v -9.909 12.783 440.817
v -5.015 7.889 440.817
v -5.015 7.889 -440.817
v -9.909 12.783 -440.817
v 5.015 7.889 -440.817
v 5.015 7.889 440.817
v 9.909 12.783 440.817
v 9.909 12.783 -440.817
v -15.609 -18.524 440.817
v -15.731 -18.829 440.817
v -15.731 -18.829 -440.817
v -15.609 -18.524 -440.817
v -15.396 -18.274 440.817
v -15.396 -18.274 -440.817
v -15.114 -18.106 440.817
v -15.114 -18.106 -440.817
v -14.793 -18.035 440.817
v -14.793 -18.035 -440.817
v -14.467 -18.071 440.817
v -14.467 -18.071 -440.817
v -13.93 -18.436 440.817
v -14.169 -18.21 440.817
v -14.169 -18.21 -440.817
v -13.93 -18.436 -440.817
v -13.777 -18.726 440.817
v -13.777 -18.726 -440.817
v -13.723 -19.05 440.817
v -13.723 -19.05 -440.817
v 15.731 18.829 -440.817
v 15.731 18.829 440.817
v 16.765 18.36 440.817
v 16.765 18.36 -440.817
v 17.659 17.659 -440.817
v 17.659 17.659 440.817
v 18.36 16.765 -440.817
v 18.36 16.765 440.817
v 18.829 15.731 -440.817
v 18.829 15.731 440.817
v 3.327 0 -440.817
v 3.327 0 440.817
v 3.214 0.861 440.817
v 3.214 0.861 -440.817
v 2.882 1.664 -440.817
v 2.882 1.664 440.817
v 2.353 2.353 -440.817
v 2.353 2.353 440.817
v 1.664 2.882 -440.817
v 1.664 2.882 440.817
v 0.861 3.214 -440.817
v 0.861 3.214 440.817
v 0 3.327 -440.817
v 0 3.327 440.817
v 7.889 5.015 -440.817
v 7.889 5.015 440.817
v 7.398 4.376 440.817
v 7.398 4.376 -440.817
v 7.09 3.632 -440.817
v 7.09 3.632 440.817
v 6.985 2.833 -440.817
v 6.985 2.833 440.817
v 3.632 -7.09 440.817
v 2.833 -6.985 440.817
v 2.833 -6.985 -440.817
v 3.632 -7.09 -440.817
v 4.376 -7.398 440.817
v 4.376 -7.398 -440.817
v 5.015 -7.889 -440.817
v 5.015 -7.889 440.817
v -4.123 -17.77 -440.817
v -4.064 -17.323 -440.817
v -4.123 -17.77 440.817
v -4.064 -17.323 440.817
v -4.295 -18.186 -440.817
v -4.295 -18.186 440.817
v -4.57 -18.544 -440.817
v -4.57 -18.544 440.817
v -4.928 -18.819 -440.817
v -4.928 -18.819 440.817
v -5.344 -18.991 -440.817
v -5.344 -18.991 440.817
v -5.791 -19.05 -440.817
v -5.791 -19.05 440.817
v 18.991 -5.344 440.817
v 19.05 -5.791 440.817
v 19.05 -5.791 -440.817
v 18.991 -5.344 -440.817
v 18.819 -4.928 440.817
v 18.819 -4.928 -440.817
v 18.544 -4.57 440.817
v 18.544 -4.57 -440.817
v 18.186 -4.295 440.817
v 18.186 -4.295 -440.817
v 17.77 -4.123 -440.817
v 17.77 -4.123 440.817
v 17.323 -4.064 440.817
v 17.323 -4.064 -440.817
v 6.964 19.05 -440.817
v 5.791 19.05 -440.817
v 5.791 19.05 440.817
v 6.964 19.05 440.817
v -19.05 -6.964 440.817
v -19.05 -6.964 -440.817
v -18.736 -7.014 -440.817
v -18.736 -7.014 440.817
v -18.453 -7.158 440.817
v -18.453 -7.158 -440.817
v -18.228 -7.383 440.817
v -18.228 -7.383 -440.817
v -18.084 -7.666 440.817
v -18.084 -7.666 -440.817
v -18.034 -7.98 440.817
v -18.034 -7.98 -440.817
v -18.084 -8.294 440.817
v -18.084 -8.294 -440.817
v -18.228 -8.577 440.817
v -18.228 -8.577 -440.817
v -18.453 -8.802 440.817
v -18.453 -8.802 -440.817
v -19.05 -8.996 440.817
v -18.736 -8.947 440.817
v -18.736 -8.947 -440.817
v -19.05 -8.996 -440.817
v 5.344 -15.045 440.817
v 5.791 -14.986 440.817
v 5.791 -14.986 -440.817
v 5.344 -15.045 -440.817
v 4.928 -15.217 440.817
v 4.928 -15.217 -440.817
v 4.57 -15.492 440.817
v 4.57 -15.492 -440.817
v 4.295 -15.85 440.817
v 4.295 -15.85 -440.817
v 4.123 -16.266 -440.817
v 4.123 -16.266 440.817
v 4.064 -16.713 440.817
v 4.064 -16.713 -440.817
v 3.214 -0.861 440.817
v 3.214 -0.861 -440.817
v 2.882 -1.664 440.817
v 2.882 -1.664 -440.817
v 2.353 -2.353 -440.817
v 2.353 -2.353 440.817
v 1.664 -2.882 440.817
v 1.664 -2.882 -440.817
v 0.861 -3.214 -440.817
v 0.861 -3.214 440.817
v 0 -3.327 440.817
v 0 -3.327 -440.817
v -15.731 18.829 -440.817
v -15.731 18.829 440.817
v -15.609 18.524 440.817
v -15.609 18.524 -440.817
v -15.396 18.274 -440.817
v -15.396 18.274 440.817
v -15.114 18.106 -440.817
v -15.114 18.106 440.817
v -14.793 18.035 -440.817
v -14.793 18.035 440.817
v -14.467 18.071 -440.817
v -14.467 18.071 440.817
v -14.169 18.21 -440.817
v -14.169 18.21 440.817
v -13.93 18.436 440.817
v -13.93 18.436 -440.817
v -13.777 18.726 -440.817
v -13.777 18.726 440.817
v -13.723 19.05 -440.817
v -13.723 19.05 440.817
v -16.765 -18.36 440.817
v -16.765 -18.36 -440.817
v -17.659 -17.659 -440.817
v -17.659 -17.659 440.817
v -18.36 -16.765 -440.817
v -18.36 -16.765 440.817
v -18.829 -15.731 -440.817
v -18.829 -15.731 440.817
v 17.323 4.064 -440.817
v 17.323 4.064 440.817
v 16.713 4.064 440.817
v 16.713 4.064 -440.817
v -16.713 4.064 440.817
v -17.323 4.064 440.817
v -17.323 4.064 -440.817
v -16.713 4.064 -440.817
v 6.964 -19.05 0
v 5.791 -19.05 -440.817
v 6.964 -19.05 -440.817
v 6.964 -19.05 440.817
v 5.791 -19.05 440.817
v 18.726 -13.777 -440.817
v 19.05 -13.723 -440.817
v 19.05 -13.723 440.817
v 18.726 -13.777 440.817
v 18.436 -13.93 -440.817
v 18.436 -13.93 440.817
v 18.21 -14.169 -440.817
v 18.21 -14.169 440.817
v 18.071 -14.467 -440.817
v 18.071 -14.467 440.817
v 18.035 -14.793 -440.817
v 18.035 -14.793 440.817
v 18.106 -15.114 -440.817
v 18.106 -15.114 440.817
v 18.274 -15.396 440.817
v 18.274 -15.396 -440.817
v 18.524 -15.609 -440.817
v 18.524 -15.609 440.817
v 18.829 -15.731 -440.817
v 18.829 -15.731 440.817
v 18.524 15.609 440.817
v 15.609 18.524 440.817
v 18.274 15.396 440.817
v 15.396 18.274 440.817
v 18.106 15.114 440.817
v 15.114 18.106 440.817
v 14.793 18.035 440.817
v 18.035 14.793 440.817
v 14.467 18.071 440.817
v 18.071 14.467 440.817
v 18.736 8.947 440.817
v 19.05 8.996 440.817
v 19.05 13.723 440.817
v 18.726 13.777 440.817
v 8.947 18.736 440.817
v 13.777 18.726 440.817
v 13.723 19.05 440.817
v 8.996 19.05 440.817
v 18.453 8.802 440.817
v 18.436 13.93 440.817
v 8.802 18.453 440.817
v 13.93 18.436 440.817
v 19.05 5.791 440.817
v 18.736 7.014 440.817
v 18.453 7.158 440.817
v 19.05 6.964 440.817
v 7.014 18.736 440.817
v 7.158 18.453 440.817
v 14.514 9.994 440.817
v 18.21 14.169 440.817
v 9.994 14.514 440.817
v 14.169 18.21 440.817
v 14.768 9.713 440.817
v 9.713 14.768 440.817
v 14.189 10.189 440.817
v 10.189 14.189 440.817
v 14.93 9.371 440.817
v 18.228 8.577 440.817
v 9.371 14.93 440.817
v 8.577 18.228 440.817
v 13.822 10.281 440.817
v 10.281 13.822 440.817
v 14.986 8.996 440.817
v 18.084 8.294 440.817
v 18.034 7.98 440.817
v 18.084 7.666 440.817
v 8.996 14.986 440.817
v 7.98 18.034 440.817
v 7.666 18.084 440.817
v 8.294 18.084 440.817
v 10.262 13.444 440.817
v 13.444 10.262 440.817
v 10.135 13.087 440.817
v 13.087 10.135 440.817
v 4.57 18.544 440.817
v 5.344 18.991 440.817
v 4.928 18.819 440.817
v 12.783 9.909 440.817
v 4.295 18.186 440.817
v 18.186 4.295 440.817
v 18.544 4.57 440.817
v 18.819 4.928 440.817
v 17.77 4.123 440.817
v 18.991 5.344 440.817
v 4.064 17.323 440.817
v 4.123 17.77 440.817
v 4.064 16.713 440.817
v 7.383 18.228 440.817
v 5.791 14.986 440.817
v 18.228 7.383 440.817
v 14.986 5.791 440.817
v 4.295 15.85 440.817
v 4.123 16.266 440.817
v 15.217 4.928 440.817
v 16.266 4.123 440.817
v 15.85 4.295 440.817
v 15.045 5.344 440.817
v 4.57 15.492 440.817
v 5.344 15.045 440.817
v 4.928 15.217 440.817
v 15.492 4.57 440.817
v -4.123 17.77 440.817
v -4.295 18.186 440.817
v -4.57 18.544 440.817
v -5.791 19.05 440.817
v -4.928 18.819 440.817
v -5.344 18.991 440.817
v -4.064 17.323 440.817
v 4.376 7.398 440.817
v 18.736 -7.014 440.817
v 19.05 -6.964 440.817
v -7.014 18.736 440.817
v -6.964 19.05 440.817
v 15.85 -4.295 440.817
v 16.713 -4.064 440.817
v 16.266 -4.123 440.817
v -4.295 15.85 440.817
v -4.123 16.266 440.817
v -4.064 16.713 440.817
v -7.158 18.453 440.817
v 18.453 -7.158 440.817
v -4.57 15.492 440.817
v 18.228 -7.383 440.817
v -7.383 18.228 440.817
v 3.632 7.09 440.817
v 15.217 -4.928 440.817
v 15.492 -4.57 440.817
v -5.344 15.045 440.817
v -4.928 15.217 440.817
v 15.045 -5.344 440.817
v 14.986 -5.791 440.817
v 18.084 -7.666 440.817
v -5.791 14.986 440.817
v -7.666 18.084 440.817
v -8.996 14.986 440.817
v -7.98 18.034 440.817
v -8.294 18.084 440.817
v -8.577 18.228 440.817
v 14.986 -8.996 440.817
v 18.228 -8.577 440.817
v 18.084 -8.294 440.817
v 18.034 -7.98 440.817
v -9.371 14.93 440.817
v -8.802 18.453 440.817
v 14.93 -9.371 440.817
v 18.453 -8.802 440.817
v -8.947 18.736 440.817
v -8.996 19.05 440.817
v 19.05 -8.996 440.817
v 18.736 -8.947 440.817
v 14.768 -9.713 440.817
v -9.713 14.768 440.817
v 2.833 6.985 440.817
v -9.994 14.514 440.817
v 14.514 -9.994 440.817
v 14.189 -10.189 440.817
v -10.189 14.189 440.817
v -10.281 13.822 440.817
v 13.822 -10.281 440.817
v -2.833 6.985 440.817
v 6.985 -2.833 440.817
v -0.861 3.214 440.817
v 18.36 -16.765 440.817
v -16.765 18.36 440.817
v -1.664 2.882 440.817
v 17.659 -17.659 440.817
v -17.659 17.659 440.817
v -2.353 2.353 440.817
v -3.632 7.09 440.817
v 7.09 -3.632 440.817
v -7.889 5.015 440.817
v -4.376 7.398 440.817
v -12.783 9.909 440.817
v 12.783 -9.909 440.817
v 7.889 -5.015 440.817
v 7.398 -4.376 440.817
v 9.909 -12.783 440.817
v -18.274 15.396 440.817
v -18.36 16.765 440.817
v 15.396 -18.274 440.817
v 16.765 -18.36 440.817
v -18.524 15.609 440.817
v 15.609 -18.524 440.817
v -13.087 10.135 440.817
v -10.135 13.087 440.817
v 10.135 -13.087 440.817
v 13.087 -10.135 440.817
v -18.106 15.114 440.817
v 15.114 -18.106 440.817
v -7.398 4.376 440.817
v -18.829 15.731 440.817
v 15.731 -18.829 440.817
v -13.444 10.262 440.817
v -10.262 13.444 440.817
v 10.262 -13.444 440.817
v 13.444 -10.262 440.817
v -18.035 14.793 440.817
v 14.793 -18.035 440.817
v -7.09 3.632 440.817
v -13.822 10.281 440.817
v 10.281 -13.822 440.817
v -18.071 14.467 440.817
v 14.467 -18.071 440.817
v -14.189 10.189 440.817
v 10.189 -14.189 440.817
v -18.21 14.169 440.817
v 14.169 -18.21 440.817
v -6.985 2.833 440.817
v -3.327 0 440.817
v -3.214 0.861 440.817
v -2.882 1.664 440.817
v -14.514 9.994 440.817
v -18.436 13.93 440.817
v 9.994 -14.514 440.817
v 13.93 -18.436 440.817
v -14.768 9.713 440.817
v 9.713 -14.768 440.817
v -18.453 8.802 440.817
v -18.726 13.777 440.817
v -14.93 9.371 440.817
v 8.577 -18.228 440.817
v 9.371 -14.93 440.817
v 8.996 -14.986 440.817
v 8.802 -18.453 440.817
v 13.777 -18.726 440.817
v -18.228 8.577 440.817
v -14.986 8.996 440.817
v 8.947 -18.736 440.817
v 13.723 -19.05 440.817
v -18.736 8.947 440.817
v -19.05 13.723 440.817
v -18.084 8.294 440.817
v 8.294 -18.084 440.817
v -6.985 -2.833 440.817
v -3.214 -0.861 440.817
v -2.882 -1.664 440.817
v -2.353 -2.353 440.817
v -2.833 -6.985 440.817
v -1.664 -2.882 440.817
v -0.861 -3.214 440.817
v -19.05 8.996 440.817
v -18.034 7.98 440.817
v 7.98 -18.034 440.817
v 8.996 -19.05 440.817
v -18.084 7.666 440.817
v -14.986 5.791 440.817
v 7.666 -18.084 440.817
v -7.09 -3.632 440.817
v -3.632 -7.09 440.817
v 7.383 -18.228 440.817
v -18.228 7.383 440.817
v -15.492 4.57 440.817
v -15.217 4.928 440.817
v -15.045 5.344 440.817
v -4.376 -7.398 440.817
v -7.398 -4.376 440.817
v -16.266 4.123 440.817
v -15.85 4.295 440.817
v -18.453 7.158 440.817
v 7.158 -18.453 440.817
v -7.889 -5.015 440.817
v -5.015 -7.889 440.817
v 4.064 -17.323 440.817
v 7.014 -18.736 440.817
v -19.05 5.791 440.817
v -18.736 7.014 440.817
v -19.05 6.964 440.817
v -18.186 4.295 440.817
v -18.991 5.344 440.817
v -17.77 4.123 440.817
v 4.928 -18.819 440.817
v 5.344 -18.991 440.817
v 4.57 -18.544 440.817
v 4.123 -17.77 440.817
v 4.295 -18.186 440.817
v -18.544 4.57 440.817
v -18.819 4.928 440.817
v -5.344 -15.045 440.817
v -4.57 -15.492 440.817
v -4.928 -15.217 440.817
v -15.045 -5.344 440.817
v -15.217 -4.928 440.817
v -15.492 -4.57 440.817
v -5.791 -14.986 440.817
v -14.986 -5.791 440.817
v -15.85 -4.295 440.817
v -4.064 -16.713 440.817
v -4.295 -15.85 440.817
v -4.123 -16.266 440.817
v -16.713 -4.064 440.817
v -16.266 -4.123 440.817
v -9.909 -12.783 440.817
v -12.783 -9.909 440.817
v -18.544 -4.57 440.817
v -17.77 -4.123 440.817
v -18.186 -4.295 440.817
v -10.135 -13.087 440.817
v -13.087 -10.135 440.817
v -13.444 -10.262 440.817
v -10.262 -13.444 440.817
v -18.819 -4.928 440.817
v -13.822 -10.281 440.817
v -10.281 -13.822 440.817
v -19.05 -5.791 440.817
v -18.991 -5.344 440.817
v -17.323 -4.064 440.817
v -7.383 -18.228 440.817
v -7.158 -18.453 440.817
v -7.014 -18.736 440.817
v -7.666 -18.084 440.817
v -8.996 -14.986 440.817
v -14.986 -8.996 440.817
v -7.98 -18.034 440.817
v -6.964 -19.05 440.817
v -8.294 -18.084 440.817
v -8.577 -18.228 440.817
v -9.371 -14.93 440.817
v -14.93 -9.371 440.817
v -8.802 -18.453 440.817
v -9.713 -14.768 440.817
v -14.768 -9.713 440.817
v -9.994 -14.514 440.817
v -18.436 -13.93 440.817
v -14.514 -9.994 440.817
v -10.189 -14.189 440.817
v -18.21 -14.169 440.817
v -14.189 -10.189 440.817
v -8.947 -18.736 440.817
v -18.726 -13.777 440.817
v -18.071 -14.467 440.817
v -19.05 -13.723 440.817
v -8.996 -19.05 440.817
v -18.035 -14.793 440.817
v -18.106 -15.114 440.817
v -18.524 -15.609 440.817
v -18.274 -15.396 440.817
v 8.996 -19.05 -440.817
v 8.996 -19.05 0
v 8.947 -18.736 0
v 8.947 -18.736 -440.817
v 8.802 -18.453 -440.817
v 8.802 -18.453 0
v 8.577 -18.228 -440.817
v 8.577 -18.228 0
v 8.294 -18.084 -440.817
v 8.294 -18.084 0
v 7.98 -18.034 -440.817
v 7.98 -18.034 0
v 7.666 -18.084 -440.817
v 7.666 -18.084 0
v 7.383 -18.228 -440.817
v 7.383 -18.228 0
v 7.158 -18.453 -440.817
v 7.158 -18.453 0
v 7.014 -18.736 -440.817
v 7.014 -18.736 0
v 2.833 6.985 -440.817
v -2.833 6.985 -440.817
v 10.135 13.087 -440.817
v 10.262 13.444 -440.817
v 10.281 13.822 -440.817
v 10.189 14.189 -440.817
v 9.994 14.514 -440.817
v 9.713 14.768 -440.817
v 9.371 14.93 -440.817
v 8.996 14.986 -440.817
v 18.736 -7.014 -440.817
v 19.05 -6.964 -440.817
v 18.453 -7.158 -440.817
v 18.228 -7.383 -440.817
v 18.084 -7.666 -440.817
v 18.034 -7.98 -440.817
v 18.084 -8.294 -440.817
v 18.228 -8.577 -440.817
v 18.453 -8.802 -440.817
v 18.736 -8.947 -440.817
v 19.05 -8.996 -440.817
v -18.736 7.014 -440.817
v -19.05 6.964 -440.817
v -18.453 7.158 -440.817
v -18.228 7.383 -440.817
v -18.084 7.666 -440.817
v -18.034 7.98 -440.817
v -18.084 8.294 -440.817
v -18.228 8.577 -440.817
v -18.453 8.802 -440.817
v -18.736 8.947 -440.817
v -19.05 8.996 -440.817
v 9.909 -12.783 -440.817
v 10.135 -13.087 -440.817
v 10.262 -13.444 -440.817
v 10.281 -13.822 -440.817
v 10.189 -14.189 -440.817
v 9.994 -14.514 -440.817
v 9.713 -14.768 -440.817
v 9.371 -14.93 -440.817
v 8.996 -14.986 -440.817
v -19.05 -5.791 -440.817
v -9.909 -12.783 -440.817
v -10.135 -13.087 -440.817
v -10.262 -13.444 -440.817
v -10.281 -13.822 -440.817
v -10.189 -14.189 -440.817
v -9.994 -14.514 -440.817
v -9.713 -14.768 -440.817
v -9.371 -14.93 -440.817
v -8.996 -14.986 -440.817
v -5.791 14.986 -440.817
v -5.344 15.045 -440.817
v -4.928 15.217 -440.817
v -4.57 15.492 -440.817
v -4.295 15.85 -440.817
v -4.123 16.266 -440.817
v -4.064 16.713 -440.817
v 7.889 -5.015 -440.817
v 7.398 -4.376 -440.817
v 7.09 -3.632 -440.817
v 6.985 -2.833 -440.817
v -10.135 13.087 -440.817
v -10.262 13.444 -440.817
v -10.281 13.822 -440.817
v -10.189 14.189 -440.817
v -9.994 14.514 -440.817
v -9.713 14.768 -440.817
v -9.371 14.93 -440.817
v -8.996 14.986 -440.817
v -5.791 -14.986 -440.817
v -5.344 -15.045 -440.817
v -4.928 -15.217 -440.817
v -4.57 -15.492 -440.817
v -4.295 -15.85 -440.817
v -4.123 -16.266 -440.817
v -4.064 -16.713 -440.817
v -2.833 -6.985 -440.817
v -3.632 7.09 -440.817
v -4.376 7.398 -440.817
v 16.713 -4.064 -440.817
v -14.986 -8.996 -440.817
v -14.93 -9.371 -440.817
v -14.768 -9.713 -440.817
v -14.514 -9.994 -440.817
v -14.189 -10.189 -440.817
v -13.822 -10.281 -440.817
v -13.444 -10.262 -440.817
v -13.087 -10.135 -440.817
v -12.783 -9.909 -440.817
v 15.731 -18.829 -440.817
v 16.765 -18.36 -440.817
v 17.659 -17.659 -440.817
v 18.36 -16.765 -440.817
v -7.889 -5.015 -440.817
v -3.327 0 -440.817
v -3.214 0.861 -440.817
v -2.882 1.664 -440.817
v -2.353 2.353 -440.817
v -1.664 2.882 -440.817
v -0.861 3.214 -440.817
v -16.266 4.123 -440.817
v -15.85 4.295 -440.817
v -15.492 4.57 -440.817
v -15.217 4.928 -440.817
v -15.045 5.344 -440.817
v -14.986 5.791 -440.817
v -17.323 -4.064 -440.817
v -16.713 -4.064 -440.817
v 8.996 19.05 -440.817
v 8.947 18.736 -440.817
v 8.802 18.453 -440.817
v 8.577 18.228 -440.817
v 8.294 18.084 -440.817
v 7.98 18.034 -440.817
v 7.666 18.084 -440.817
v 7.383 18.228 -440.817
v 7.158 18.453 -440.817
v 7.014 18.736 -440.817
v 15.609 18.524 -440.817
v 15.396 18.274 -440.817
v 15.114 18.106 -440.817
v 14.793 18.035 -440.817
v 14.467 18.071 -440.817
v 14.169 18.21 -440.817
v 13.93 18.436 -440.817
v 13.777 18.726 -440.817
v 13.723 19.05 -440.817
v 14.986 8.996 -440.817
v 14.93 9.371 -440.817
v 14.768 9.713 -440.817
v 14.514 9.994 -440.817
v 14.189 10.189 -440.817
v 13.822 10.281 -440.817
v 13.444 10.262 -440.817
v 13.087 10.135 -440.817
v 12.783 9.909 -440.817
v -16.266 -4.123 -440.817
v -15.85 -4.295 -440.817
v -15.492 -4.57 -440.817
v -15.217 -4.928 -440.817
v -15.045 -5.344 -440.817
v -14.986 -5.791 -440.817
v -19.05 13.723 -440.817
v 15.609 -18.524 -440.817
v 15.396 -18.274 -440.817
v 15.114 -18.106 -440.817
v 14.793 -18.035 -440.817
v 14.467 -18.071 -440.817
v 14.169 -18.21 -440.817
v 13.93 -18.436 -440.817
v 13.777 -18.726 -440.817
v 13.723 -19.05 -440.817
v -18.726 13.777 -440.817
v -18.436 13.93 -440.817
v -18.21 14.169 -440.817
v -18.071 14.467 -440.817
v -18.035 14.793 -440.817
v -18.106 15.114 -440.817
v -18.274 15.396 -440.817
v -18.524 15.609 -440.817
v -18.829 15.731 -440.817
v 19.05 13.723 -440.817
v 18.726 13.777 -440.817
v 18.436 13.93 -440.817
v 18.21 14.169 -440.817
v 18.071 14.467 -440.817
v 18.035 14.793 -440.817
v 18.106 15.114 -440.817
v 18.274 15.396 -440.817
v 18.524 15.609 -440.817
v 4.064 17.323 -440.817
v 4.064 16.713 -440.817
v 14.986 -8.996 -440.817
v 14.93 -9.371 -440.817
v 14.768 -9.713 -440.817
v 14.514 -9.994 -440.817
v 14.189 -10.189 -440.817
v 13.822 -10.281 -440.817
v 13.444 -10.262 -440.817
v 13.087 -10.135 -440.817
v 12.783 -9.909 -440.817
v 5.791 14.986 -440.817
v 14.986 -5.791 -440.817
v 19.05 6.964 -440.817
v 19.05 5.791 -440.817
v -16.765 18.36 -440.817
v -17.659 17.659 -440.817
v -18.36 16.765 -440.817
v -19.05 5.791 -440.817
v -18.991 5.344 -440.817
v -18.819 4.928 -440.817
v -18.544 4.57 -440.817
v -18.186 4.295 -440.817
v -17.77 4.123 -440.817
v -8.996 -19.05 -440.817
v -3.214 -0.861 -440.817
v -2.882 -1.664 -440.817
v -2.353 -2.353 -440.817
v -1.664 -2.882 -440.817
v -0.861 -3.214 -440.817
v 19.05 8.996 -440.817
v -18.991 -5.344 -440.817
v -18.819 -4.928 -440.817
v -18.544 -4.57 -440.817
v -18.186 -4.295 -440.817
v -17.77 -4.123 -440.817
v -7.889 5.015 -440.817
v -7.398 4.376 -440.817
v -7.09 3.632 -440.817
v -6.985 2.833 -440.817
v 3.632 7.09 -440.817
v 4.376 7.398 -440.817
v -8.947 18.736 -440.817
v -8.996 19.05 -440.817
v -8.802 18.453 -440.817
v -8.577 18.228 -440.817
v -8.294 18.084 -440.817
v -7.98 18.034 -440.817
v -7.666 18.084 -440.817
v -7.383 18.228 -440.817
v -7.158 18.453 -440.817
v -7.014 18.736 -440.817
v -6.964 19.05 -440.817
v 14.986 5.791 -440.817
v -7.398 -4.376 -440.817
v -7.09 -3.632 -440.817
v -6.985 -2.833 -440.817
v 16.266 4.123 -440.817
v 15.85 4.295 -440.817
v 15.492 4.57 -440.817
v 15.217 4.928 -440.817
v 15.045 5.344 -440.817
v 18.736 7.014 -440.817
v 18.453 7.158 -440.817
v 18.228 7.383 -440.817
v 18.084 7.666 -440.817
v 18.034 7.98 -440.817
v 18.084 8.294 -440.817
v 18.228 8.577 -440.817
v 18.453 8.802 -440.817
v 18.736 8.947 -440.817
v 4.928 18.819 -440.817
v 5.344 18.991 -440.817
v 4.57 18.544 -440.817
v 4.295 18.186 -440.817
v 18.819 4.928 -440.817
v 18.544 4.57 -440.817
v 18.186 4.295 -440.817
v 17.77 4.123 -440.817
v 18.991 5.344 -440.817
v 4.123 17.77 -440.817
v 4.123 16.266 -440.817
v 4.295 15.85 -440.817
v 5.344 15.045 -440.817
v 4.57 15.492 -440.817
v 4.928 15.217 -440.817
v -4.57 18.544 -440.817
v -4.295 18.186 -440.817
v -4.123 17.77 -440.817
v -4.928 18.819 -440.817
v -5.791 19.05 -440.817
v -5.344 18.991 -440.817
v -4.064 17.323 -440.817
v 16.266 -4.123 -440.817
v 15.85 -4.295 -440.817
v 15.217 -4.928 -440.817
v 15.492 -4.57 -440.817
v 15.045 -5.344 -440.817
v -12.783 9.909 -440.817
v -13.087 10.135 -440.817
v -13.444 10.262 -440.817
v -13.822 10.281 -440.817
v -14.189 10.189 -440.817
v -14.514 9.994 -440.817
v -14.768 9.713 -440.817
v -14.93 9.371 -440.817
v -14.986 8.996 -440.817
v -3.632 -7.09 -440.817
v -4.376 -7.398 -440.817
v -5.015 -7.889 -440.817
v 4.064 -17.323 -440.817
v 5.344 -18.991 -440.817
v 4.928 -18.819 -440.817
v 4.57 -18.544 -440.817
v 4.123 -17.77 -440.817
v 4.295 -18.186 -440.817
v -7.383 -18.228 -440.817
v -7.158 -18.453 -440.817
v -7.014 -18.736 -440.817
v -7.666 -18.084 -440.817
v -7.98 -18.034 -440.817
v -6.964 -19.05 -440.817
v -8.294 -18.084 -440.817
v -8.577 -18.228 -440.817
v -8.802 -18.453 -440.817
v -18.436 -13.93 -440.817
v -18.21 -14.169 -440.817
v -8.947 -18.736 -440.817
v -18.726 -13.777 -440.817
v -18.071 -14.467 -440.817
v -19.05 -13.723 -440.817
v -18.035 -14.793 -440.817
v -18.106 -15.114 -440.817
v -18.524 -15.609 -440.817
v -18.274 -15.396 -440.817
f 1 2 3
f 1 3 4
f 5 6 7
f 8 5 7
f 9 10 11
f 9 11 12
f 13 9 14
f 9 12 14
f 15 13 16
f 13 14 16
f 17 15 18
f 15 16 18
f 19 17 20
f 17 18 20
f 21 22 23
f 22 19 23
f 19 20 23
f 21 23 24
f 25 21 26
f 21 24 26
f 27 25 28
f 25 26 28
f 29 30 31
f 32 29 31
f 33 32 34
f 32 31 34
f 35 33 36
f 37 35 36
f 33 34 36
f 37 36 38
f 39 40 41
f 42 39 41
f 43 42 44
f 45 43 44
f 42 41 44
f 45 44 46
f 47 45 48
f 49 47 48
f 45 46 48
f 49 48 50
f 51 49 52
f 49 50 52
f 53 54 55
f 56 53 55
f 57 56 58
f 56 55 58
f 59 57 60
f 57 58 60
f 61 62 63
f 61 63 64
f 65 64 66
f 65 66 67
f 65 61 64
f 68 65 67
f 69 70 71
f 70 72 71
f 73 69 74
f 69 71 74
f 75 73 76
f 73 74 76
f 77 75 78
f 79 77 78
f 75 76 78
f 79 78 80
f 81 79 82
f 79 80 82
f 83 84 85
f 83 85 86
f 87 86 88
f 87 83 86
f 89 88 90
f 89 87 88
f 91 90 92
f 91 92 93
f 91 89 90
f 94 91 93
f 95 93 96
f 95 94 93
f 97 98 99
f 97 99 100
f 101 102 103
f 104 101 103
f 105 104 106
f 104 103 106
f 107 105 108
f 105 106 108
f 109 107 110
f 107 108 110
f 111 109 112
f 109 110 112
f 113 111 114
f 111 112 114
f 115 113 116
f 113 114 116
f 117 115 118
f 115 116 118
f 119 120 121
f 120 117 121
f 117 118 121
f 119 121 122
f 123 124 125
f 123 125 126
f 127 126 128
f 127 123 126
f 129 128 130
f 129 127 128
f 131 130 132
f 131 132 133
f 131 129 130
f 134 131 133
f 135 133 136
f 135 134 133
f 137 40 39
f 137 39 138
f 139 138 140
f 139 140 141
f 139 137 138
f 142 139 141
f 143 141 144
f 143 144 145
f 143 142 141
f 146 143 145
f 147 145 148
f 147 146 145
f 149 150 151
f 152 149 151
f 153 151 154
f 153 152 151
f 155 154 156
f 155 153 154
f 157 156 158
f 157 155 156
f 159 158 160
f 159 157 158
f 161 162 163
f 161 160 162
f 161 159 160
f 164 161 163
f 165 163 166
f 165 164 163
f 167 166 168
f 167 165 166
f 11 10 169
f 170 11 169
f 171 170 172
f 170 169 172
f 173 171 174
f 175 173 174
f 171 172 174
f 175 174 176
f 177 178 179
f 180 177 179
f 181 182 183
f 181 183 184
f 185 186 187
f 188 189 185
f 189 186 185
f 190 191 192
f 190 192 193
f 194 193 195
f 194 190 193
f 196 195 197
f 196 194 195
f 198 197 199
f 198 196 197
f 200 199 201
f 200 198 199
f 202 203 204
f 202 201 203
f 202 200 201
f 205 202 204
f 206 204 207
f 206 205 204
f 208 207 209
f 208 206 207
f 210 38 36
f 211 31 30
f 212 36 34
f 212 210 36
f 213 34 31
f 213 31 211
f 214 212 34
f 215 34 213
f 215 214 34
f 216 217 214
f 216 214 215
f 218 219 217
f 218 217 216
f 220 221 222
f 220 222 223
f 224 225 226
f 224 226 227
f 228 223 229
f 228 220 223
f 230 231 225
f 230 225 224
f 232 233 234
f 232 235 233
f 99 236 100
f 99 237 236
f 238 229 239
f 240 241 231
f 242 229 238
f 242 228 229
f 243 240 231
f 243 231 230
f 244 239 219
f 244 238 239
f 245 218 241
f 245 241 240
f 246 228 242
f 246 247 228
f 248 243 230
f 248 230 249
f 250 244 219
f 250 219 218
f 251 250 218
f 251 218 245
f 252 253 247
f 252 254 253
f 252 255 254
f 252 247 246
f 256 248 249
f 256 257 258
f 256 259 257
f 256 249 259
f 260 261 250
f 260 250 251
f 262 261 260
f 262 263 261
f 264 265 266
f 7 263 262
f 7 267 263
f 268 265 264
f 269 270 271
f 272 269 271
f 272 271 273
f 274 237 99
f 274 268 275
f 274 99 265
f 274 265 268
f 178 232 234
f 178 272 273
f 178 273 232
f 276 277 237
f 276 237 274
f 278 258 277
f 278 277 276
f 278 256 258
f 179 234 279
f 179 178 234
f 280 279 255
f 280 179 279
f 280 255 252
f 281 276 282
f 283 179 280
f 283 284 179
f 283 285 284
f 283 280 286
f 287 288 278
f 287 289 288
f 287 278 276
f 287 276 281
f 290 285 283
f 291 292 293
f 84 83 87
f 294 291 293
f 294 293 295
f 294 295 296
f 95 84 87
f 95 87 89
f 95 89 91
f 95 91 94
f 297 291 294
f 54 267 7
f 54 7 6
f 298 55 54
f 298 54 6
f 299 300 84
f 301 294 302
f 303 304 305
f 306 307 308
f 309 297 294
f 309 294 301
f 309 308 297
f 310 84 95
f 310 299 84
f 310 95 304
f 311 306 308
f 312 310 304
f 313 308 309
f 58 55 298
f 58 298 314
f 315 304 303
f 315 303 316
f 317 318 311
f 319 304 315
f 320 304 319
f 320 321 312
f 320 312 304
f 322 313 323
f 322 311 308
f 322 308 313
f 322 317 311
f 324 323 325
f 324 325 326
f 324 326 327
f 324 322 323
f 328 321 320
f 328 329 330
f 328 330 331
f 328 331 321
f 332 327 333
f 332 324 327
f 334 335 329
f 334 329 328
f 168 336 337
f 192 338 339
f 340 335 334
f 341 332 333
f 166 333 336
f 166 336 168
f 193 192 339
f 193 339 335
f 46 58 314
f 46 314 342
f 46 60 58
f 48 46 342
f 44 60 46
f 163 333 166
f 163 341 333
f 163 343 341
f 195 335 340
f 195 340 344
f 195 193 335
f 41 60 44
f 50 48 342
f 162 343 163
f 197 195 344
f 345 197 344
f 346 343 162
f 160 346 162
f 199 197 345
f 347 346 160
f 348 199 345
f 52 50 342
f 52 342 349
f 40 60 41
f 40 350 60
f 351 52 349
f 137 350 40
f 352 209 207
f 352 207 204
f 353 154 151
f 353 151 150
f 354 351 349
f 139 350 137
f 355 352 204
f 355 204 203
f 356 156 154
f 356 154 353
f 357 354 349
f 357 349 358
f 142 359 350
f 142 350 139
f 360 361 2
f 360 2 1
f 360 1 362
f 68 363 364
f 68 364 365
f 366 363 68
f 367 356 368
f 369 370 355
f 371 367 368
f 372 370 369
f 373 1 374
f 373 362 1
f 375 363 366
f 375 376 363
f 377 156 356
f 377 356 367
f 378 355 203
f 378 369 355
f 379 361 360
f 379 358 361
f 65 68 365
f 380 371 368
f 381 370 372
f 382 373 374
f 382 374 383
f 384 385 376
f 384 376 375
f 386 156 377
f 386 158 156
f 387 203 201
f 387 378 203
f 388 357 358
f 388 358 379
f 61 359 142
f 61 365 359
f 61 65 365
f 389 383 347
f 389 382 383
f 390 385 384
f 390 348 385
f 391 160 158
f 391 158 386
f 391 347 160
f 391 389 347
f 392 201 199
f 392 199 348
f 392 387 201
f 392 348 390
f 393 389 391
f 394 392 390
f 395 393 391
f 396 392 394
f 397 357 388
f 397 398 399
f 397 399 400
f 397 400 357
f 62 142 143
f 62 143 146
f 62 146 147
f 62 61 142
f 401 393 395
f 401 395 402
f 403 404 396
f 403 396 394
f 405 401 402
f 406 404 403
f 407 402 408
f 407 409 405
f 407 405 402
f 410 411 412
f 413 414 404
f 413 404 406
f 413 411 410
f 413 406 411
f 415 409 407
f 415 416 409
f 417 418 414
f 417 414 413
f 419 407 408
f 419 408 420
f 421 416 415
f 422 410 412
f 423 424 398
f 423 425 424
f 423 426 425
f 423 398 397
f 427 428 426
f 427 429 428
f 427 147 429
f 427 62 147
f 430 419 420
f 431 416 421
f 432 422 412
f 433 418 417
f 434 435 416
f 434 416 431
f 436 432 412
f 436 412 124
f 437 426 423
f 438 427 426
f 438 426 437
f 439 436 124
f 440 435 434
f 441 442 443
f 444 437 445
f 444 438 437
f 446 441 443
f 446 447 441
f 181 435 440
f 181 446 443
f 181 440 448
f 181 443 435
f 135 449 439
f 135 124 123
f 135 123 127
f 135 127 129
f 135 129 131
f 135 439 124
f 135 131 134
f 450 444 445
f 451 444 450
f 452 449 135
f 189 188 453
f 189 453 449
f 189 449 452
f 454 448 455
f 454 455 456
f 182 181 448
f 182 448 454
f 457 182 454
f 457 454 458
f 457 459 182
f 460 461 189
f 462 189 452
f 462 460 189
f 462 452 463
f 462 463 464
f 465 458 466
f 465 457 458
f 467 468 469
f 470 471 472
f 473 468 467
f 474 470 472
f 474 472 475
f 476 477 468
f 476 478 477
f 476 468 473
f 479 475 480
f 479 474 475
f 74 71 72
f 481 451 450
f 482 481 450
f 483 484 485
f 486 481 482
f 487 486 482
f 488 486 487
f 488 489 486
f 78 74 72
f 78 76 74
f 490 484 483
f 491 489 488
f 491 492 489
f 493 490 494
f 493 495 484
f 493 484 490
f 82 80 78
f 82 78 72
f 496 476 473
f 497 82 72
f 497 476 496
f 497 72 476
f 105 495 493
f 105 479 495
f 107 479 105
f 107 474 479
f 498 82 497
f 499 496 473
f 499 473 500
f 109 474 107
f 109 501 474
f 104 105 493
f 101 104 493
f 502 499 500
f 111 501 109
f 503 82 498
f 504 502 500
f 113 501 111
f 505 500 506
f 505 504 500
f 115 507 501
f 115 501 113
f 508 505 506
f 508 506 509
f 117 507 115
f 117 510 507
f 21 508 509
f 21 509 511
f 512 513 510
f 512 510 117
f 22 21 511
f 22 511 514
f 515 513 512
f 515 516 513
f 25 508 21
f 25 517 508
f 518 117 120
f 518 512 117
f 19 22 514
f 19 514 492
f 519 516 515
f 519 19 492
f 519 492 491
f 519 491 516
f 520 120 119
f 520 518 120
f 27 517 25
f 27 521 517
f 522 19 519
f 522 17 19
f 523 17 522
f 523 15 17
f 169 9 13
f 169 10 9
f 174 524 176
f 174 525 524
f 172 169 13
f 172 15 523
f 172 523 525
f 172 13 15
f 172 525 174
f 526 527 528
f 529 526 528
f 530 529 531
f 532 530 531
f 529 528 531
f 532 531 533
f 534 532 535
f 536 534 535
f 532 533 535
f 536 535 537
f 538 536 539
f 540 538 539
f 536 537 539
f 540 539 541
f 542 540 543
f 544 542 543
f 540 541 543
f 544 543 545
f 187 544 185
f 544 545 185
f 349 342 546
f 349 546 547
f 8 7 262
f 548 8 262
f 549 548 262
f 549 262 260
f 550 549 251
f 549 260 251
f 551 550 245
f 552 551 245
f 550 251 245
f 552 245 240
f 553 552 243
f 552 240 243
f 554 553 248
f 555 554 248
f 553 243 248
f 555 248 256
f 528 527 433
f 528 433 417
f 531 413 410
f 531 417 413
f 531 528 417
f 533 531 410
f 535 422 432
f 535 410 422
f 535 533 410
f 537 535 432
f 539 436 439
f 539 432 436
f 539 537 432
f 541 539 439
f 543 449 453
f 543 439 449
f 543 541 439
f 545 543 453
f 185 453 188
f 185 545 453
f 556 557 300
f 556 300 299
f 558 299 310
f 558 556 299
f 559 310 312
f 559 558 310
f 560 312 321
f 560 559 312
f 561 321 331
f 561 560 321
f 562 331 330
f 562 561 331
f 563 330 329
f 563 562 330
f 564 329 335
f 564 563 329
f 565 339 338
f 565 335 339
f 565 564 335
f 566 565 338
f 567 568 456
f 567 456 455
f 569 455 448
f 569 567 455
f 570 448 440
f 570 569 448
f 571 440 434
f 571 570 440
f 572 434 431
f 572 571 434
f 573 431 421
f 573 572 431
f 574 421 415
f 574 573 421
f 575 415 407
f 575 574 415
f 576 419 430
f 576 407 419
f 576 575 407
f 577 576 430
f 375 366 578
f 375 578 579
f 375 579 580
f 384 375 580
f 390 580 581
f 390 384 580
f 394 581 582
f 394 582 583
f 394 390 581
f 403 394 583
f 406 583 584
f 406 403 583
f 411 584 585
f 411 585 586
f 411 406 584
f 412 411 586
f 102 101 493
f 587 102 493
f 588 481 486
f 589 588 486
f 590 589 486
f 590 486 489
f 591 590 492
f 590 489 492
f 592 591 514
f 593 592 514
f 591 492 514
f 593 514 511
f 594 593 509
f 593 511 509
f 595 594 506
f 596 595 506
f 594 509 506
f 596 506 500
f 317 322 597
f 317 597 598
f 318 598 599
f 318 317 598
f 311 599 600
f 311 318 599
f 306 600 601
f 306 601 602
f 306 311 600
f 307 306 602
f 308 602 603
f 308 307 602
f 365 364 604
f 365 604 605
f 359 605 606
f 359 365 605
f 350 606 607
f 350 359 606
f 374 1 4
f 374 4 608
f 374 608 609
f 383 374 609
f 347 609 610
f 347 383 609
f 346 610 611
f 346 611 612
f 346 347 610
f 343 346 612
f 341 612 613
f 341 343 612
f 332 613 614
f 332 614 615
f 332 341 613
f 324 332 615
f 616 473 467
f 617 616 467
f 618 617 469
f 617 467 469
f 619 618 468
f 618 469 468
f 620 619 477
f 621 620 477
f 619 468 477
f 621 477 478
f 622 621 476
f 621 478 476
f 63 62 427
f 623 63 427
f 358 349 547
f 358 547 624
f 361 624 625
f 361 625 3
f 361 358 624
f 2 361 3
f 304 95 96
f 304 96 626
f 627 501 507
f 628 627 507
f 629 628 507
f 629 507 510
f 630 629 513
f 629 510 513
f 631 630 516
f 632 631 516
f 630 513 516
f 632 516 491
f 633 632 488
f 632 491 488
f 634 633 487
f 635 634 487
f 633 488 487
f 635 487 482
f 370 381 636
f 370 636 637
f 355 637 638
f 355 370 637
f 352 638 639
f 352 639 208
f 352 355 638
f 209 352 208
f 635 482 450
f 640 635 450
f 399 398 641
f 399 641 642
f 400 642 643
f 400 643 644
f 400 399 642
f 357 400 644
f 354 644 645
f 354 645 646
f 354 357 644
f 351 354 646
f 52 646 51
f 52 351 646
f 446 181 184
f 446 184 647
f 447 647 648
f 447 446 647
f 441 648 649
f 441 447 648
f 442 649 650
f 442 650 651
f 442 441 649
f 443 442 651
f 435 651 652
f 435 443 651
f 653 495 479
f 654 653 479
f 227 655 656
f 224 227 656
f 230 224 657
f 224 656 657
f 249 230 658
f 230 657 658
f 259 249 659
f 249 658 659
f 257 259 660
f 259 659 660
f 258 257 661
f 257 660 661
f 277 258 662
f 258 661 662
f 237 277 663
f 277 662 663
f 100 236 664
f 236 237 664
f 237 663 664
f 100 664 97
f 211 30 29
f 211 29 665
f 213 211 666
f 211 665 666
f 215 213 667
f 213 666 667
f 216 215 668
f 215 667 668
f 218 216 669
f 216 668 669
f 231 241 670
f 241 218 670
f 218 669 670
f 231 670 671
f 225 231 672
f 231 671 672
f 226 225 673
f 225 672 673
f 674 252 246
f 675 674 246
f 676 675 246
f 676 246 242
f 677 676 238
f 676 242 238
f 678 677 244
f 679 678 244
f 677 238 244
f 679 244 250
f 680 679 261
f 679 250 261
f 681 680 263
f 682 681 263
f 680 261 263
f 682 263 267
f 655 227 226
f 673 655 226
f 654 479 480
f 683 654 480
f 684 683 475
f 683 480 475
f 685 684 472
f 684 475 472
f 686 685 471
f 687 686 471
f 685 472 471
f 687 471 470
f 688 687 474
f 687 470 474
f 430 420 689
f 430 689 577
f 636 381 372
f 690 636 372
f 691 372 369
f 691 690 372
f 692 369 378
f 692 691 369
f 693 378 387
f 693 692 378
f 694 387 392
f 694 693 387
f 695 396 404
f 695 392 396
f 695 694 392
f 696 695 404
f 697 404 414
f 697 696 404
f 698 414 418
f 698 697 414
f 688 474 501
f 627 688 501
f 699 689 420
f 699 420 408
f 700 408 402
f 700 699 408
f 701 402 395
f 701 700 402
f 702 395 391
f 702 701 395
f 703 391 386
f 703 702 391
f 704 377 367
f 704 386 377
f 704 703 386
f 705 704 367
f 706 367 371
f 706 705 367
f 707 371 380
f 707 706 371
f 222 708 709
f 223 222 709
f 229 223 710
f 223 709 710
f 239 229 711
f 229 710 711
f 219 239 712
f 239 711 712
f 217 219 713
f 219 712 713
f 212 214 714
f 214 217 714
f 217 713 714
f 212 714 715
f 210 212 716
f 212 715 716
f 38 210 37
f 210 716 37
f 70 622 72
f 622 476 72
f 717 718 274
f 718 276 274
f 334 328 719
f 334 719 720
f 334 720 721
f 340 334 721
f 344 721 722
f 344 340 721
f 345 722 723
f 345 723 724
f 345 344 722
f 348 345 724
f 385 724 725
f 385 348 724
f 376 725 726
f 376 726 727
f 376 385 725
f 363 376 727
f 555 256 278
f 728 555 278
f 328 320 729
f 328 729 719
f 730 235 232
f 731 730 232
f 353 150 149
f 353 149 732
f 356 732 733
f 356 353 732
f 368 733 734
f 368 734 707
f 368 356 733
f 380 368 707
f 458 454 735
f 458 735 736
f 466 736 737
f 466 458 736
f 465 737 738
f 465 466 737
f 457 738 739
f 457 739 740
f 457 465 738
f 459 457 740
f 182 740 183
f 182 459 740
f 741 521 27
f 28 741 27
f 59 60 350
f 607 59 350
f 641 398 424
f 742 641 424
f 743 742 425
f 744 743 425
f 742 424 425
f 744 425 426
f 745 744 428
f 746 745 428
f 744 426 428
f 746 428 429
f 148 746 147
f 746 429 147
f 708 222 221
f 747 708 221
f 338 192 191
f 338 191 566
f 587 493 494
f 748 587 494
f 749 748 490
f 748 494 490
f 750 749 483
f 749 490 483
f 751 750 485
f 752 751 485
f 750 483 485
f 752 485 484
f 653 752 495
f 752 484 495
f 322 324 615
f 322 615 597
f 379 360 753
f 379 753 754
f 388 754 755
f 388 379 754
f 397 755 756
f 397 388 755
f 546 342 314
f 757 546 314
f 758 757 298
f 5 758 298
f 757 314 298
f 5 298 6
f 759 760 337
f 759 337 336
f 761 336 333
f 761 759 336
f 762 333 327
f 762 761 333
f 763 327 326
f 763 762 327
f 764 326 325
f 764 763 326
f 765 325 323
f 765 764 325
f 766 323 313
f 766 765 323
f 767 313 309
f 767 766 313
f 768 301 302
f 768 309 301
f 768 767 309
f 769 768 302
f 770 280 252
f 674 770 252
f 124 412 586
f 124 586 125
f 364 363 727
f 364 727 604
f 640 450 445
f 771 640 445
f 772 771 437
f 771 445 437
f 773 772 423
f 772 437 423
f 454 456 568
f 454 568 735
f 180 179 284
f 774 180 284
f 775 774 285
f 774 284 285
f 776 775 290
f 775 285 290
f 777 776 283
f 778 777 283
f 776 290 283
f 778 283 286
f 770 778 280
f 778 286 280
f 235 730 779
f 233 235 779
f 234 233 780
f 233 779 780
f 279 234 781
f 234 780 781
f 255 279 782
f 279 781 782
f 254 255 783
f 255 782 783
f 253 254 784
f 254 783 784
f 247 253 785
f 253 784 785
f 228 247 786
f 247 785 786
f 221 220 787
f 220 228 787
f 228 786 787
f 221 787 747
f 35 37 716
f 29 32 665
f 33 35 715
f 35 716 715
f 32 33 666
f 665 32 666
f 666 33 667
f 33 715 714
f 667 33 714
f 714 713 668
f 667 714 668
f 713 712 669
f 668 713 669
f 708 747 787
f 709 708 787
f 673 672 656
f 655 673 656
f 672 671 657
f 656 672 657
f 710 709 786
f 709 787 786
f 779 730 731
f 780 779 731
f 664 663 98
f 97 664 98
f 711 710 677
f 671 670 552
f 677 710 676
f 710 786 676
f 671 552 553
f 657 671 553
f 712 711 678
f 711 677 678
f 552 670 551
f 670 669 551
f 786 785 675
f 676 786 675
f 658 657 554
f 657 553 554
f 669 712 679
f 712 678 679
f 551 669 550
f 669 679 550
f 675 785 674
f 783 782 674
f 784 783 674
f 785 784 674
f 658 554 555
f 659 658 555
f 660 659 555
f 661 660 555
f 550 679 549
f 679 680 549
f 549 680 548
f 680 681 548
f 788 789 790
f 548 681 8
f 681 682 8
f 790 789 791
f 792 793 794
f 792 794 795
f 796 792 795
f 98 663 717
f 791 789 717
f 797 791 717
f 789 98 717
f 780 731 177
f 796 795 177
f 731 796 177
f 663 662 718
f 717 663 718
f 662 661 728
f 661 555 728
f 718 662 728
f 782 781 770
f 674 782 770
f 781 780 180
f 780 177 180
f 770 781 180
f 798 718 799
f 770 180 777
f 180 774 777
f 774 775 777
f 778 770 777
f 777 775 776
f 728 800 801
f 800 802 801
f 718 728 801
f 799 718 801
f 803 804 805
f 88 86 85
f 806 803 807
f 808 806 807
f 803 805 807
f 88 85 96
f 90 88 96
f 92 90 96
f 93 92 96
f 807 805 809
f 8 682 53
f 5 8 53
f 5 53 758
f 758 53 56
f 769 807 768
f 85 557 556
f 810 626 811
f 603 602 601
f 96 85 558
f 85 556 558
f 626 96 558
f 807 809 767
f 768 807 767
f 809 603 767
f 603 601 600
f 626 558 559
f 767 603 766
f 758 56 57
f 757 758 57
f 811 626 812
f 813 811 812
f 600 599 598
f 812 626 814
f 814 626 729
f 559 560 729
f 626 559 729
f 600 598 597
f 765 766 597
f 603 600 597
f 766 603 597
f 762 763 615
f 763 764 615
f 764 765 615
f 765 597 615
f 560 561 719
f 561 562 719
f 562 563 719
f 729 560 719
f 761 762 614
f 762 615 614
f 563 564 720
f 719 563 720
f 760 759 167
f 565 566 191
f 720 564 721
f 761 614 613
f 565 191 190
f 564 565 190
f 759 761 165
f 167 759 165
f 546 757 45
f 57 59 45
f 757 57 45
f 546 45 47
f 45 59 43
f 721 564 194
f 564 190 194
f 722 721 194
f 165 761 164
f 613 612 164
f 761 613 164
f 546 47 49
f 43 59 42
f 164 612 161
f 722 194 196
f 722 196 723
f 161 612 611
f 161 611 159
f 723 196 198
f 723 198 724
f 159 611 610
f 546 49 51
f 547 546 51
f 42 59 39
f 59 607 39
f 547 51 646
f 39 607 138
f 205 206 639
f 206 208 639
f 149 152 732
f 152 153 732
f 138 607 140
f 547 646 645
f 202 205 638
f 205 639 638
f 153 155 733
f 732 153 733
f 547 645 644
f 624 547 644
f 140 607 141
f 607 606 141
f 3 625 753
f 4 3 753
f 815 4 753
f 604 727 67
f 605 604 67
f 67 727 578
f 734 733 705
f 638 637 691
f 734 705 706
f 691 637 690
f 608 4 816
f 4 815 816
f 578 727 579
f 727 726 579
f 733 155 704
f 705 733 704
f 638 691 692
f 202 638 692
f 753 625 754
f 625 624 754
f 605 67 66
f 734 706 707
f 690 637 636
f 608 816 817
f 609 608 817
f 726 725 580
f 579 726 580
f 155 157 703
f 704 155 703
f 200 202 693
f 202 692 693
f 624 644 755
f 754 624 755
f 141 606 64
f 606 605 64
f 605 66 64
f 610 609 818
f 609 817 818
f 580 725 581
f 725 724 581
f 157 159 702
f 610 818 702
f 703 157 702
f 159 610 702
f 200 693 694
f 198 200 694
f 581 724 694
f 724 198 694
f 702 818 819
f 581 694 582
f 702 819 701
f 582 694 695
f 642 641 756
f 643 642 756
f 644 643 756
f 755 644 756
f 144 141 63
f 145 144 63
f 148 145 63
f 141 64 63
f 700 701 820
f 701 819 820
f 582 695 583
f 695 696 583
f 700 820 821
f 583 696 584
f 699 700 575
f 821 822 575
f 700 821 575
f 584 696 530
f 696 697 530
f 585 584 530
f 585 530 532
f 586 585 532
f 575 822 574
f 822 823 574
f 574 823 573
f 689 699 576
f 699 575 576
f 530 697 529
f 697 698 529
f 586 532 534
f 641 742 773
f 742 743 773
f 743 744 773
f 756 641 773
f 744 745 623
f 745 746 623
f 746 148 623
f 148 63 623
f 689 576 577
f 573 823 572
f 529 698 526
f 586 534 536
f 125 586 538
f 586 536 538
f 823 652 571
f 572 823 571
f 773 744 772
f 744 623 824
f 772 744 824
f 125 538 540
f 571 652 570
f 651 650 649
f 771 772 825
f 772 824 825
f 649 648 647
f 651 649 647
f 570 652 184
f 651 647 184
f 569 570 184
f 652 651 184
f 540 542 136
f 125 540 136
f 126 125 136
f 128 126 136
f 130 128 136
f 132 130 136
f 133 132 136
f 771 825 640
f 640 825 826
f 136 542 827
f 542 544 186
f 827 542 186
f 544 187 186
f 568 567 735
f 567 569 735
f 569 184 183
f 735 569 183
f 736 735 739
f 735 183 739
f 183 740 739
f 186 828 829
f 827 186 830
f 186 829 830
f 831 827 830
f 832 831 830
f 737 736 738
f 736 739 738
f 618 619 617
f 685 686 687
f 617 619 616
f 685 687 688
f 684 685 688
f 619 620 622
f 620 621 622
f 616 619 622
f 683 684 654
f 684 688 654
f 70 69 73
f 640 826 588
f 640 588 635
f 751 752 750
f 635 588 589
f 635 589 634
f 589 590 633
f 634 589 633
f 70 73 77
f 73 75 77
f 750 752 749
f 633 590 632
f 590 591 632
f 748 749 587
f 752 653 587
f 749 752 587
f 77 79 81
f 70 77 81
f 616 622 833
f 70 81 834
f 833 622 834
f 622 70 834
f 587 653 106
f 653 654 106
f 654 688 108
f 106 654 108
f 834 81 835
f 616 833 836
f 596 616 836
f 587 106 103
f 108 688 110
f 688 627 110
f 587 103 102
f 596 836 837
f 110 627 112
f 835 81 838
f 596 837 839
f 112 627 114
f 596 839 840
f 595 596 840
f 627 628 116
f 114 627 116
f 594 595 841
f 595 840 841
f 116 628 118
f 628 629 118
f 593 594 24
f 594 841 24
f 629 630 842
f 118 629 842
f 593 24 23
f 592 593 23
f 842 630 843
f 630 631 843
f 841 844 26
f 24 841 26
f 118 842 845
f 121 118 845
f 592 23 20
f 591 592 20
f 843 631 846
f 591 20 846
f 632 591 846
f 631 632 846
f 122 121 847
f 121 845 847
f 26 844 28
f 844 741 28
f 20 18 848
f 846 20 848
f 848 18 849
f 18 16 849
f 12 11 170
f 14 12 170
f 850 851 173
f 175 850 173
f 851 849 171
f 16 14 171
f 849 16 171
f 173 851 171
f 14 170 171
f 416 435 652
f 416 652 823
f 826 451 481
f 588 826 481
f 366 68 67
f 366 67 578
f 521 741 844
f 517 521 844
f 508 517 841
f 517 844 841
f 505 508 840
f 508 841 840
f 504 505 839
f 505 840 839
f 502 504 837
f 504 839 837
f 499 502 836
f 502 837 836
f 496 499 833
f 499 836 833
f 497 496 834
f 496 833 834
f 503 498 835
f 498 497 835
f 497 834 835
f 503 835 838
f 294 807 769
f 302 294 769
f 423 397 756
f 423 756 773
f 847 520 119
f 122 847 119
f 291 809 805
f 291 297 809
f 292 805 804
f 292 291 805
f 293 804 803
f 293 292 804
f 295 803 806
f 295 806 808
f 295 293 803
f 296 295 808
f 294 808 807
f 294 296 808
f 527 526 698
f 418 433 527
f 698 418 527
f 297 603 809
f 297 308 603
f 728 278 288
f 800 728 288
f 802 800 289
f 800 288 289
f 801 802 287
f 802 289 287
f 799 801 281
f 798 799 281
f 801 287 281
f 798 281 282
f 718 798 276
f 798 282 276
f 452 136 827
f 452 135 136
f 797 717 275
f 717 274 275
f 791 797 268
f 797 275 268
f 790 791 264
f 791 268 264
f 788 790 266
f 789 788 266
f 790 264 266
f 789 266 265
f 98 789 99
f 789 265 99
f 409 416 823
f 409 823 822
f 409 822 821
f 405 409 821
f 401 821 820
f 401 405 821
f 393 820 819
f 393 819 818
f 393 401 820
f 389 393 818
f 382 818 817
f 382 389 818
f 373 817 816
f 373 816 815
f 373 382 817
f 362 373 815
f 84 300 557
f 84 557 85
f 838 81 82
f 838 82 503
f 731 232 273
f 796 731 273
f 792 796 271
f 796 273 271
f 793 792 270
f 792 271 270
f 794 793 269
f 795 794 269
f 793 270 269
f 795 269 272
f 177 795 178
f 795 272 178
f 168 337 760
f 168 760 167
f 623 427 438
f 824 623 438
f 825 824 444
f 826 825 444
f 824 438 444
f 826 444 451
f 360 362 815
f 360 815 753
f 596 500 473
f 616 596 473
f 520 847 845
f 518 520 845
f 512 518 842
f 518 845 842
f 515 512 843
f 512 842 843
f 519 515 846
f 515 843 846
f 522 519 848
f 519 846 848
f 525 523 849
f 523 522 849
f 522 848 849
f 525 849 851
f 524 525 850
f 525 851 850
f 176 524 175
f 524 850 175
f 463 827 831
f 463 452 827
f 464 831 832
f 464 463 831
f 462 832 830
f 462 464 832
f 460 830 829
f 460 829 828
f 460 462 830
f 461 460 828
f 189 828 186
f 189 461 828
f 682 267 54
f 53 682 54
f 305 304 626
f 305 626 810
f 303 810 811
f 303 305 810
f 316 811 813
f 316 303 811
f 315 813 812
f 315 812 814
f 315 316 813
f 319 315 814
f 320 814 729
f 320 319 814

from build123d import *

# Parameters (mm, degrees)
BOSS_EXTRUDE1_DEPTH     = 440.817
SKETCH5_R               = 1.016
CUT_EXTRUDE1_DEPTH      = 441.817
CUT_EXTRUDE1_DEPTH_BACK = 441.817


with BuildPart() as part:
    # Sketch4 → Boss-Extrude1 (new body, symmetric)
    with BuildSketch(Plane.XY):
        with BuildLine():
            Line((5.7912, -19.05), (14.3002, -19.05))
            ThreePointArc((14.3002, -19.05), (17.658815789, -17.658815789), (19.05, -14.3002))
            Line((19.05, -14.3002), (19.05, -5.7912))
            ThreePointArc((19.05, -5.7912), (18.544114832, -4.569885168), (17.3228, -4.064))
            Line((17.3228, -4.064), (16.7132, -4.064))
            ThreePointArc((16.7132, -4.064), (15.491885168, -4.569885168), (14.986, -5.7912))
            Line((14.986, -5.7912), (14.986, -8.996305235))
            ThreePointArc((14.986, -8.996305235), (14.189232738, -10.188751711), (12.782646215, -9.908964256))
            Line((12.782646215, -9.908964256), (7.888897763, -5.015215804))
            ThreePointArc((7.888897763, -5.015215804), (7.219915375, -4.014012907), (6.985, -2.833013566))
            Line((6.985, -2.833013566), (6.985, 0))
            Line((6.985, 0), (3.3274, 0))
            ThreePointArc((3.3274, 0), (2.352827104, -2.352827104), (0, -3.3274))
            Line((0, -3.3274), (0, -6.985))
            Line((0, -6.985), (2.833013566, -6.985))
            ThreePointArc((2.833013566, -6.985), (4.014012907, -7.219915375), (5.015215804, -7.888897763))
            Line((5.015215804, -7.888897763), (9.908964256, -12.782646215))
            ThreePointArc((9.908964256, -12.782646215), (10.188751711, -14.189232738), (8.996305235, -14.986))
            Line((8.996305235, -14.986), (5.7912, -14.986))
            ThreePointArc((5.7912, -14.986), (4.569885168, -15.491885168), (4.064, -16.7132))
            Line((4.064, -16.7132), (4.064, -17.3228))
            ThreePointArc((4.064, -17.3228), (4.569885168, -18.544114832), (5.7912, -19.05))
        make_face()
    extrude(amount=BOSS_EXTRUDE1_DEPTH, both=True)

    # Sketch5 → Cut-Extrude1 (cut, two sides)
    with BuildSketch(Plane.XY) as cut_extrude1_sk:
        with Locations((14.739477062, -19.05)):
            Circle(SKETCH5_R)
        with Locations((7.980305235, -19.05)):
            Circle(SKETCH5_R)
        with Locations((19.05, -14.739477062)):
            Circle(SKETCH5_R)
        with Locations((19.05, -7.980305235)):
            Circle(SKETCH5_R)
    extrude(amount=CUT_EXTRUDE1_DEPTH, mode=Mode.SUBTRACT)
    extrude(cut_extrude1_sk.sketch, amount=-CUT_EXTRUDE1_DEPTH_BACK, mode=Mode.SUBTRACT)

    # Mirror1: part across plane


with BuildPart() as part_1:
    add(part.part)
    add(part.part.mirror(Plane(origin=(0, 0, 0), x_dir=(0, 0, 1), z_dir=(1, 0, 0))))

    # Mirror2: part across plane


with BuildPart() as part_2:
    add(part_1.part)
    add(part_1.part.mirror(Plane.ZX))


solid = part_2.part
